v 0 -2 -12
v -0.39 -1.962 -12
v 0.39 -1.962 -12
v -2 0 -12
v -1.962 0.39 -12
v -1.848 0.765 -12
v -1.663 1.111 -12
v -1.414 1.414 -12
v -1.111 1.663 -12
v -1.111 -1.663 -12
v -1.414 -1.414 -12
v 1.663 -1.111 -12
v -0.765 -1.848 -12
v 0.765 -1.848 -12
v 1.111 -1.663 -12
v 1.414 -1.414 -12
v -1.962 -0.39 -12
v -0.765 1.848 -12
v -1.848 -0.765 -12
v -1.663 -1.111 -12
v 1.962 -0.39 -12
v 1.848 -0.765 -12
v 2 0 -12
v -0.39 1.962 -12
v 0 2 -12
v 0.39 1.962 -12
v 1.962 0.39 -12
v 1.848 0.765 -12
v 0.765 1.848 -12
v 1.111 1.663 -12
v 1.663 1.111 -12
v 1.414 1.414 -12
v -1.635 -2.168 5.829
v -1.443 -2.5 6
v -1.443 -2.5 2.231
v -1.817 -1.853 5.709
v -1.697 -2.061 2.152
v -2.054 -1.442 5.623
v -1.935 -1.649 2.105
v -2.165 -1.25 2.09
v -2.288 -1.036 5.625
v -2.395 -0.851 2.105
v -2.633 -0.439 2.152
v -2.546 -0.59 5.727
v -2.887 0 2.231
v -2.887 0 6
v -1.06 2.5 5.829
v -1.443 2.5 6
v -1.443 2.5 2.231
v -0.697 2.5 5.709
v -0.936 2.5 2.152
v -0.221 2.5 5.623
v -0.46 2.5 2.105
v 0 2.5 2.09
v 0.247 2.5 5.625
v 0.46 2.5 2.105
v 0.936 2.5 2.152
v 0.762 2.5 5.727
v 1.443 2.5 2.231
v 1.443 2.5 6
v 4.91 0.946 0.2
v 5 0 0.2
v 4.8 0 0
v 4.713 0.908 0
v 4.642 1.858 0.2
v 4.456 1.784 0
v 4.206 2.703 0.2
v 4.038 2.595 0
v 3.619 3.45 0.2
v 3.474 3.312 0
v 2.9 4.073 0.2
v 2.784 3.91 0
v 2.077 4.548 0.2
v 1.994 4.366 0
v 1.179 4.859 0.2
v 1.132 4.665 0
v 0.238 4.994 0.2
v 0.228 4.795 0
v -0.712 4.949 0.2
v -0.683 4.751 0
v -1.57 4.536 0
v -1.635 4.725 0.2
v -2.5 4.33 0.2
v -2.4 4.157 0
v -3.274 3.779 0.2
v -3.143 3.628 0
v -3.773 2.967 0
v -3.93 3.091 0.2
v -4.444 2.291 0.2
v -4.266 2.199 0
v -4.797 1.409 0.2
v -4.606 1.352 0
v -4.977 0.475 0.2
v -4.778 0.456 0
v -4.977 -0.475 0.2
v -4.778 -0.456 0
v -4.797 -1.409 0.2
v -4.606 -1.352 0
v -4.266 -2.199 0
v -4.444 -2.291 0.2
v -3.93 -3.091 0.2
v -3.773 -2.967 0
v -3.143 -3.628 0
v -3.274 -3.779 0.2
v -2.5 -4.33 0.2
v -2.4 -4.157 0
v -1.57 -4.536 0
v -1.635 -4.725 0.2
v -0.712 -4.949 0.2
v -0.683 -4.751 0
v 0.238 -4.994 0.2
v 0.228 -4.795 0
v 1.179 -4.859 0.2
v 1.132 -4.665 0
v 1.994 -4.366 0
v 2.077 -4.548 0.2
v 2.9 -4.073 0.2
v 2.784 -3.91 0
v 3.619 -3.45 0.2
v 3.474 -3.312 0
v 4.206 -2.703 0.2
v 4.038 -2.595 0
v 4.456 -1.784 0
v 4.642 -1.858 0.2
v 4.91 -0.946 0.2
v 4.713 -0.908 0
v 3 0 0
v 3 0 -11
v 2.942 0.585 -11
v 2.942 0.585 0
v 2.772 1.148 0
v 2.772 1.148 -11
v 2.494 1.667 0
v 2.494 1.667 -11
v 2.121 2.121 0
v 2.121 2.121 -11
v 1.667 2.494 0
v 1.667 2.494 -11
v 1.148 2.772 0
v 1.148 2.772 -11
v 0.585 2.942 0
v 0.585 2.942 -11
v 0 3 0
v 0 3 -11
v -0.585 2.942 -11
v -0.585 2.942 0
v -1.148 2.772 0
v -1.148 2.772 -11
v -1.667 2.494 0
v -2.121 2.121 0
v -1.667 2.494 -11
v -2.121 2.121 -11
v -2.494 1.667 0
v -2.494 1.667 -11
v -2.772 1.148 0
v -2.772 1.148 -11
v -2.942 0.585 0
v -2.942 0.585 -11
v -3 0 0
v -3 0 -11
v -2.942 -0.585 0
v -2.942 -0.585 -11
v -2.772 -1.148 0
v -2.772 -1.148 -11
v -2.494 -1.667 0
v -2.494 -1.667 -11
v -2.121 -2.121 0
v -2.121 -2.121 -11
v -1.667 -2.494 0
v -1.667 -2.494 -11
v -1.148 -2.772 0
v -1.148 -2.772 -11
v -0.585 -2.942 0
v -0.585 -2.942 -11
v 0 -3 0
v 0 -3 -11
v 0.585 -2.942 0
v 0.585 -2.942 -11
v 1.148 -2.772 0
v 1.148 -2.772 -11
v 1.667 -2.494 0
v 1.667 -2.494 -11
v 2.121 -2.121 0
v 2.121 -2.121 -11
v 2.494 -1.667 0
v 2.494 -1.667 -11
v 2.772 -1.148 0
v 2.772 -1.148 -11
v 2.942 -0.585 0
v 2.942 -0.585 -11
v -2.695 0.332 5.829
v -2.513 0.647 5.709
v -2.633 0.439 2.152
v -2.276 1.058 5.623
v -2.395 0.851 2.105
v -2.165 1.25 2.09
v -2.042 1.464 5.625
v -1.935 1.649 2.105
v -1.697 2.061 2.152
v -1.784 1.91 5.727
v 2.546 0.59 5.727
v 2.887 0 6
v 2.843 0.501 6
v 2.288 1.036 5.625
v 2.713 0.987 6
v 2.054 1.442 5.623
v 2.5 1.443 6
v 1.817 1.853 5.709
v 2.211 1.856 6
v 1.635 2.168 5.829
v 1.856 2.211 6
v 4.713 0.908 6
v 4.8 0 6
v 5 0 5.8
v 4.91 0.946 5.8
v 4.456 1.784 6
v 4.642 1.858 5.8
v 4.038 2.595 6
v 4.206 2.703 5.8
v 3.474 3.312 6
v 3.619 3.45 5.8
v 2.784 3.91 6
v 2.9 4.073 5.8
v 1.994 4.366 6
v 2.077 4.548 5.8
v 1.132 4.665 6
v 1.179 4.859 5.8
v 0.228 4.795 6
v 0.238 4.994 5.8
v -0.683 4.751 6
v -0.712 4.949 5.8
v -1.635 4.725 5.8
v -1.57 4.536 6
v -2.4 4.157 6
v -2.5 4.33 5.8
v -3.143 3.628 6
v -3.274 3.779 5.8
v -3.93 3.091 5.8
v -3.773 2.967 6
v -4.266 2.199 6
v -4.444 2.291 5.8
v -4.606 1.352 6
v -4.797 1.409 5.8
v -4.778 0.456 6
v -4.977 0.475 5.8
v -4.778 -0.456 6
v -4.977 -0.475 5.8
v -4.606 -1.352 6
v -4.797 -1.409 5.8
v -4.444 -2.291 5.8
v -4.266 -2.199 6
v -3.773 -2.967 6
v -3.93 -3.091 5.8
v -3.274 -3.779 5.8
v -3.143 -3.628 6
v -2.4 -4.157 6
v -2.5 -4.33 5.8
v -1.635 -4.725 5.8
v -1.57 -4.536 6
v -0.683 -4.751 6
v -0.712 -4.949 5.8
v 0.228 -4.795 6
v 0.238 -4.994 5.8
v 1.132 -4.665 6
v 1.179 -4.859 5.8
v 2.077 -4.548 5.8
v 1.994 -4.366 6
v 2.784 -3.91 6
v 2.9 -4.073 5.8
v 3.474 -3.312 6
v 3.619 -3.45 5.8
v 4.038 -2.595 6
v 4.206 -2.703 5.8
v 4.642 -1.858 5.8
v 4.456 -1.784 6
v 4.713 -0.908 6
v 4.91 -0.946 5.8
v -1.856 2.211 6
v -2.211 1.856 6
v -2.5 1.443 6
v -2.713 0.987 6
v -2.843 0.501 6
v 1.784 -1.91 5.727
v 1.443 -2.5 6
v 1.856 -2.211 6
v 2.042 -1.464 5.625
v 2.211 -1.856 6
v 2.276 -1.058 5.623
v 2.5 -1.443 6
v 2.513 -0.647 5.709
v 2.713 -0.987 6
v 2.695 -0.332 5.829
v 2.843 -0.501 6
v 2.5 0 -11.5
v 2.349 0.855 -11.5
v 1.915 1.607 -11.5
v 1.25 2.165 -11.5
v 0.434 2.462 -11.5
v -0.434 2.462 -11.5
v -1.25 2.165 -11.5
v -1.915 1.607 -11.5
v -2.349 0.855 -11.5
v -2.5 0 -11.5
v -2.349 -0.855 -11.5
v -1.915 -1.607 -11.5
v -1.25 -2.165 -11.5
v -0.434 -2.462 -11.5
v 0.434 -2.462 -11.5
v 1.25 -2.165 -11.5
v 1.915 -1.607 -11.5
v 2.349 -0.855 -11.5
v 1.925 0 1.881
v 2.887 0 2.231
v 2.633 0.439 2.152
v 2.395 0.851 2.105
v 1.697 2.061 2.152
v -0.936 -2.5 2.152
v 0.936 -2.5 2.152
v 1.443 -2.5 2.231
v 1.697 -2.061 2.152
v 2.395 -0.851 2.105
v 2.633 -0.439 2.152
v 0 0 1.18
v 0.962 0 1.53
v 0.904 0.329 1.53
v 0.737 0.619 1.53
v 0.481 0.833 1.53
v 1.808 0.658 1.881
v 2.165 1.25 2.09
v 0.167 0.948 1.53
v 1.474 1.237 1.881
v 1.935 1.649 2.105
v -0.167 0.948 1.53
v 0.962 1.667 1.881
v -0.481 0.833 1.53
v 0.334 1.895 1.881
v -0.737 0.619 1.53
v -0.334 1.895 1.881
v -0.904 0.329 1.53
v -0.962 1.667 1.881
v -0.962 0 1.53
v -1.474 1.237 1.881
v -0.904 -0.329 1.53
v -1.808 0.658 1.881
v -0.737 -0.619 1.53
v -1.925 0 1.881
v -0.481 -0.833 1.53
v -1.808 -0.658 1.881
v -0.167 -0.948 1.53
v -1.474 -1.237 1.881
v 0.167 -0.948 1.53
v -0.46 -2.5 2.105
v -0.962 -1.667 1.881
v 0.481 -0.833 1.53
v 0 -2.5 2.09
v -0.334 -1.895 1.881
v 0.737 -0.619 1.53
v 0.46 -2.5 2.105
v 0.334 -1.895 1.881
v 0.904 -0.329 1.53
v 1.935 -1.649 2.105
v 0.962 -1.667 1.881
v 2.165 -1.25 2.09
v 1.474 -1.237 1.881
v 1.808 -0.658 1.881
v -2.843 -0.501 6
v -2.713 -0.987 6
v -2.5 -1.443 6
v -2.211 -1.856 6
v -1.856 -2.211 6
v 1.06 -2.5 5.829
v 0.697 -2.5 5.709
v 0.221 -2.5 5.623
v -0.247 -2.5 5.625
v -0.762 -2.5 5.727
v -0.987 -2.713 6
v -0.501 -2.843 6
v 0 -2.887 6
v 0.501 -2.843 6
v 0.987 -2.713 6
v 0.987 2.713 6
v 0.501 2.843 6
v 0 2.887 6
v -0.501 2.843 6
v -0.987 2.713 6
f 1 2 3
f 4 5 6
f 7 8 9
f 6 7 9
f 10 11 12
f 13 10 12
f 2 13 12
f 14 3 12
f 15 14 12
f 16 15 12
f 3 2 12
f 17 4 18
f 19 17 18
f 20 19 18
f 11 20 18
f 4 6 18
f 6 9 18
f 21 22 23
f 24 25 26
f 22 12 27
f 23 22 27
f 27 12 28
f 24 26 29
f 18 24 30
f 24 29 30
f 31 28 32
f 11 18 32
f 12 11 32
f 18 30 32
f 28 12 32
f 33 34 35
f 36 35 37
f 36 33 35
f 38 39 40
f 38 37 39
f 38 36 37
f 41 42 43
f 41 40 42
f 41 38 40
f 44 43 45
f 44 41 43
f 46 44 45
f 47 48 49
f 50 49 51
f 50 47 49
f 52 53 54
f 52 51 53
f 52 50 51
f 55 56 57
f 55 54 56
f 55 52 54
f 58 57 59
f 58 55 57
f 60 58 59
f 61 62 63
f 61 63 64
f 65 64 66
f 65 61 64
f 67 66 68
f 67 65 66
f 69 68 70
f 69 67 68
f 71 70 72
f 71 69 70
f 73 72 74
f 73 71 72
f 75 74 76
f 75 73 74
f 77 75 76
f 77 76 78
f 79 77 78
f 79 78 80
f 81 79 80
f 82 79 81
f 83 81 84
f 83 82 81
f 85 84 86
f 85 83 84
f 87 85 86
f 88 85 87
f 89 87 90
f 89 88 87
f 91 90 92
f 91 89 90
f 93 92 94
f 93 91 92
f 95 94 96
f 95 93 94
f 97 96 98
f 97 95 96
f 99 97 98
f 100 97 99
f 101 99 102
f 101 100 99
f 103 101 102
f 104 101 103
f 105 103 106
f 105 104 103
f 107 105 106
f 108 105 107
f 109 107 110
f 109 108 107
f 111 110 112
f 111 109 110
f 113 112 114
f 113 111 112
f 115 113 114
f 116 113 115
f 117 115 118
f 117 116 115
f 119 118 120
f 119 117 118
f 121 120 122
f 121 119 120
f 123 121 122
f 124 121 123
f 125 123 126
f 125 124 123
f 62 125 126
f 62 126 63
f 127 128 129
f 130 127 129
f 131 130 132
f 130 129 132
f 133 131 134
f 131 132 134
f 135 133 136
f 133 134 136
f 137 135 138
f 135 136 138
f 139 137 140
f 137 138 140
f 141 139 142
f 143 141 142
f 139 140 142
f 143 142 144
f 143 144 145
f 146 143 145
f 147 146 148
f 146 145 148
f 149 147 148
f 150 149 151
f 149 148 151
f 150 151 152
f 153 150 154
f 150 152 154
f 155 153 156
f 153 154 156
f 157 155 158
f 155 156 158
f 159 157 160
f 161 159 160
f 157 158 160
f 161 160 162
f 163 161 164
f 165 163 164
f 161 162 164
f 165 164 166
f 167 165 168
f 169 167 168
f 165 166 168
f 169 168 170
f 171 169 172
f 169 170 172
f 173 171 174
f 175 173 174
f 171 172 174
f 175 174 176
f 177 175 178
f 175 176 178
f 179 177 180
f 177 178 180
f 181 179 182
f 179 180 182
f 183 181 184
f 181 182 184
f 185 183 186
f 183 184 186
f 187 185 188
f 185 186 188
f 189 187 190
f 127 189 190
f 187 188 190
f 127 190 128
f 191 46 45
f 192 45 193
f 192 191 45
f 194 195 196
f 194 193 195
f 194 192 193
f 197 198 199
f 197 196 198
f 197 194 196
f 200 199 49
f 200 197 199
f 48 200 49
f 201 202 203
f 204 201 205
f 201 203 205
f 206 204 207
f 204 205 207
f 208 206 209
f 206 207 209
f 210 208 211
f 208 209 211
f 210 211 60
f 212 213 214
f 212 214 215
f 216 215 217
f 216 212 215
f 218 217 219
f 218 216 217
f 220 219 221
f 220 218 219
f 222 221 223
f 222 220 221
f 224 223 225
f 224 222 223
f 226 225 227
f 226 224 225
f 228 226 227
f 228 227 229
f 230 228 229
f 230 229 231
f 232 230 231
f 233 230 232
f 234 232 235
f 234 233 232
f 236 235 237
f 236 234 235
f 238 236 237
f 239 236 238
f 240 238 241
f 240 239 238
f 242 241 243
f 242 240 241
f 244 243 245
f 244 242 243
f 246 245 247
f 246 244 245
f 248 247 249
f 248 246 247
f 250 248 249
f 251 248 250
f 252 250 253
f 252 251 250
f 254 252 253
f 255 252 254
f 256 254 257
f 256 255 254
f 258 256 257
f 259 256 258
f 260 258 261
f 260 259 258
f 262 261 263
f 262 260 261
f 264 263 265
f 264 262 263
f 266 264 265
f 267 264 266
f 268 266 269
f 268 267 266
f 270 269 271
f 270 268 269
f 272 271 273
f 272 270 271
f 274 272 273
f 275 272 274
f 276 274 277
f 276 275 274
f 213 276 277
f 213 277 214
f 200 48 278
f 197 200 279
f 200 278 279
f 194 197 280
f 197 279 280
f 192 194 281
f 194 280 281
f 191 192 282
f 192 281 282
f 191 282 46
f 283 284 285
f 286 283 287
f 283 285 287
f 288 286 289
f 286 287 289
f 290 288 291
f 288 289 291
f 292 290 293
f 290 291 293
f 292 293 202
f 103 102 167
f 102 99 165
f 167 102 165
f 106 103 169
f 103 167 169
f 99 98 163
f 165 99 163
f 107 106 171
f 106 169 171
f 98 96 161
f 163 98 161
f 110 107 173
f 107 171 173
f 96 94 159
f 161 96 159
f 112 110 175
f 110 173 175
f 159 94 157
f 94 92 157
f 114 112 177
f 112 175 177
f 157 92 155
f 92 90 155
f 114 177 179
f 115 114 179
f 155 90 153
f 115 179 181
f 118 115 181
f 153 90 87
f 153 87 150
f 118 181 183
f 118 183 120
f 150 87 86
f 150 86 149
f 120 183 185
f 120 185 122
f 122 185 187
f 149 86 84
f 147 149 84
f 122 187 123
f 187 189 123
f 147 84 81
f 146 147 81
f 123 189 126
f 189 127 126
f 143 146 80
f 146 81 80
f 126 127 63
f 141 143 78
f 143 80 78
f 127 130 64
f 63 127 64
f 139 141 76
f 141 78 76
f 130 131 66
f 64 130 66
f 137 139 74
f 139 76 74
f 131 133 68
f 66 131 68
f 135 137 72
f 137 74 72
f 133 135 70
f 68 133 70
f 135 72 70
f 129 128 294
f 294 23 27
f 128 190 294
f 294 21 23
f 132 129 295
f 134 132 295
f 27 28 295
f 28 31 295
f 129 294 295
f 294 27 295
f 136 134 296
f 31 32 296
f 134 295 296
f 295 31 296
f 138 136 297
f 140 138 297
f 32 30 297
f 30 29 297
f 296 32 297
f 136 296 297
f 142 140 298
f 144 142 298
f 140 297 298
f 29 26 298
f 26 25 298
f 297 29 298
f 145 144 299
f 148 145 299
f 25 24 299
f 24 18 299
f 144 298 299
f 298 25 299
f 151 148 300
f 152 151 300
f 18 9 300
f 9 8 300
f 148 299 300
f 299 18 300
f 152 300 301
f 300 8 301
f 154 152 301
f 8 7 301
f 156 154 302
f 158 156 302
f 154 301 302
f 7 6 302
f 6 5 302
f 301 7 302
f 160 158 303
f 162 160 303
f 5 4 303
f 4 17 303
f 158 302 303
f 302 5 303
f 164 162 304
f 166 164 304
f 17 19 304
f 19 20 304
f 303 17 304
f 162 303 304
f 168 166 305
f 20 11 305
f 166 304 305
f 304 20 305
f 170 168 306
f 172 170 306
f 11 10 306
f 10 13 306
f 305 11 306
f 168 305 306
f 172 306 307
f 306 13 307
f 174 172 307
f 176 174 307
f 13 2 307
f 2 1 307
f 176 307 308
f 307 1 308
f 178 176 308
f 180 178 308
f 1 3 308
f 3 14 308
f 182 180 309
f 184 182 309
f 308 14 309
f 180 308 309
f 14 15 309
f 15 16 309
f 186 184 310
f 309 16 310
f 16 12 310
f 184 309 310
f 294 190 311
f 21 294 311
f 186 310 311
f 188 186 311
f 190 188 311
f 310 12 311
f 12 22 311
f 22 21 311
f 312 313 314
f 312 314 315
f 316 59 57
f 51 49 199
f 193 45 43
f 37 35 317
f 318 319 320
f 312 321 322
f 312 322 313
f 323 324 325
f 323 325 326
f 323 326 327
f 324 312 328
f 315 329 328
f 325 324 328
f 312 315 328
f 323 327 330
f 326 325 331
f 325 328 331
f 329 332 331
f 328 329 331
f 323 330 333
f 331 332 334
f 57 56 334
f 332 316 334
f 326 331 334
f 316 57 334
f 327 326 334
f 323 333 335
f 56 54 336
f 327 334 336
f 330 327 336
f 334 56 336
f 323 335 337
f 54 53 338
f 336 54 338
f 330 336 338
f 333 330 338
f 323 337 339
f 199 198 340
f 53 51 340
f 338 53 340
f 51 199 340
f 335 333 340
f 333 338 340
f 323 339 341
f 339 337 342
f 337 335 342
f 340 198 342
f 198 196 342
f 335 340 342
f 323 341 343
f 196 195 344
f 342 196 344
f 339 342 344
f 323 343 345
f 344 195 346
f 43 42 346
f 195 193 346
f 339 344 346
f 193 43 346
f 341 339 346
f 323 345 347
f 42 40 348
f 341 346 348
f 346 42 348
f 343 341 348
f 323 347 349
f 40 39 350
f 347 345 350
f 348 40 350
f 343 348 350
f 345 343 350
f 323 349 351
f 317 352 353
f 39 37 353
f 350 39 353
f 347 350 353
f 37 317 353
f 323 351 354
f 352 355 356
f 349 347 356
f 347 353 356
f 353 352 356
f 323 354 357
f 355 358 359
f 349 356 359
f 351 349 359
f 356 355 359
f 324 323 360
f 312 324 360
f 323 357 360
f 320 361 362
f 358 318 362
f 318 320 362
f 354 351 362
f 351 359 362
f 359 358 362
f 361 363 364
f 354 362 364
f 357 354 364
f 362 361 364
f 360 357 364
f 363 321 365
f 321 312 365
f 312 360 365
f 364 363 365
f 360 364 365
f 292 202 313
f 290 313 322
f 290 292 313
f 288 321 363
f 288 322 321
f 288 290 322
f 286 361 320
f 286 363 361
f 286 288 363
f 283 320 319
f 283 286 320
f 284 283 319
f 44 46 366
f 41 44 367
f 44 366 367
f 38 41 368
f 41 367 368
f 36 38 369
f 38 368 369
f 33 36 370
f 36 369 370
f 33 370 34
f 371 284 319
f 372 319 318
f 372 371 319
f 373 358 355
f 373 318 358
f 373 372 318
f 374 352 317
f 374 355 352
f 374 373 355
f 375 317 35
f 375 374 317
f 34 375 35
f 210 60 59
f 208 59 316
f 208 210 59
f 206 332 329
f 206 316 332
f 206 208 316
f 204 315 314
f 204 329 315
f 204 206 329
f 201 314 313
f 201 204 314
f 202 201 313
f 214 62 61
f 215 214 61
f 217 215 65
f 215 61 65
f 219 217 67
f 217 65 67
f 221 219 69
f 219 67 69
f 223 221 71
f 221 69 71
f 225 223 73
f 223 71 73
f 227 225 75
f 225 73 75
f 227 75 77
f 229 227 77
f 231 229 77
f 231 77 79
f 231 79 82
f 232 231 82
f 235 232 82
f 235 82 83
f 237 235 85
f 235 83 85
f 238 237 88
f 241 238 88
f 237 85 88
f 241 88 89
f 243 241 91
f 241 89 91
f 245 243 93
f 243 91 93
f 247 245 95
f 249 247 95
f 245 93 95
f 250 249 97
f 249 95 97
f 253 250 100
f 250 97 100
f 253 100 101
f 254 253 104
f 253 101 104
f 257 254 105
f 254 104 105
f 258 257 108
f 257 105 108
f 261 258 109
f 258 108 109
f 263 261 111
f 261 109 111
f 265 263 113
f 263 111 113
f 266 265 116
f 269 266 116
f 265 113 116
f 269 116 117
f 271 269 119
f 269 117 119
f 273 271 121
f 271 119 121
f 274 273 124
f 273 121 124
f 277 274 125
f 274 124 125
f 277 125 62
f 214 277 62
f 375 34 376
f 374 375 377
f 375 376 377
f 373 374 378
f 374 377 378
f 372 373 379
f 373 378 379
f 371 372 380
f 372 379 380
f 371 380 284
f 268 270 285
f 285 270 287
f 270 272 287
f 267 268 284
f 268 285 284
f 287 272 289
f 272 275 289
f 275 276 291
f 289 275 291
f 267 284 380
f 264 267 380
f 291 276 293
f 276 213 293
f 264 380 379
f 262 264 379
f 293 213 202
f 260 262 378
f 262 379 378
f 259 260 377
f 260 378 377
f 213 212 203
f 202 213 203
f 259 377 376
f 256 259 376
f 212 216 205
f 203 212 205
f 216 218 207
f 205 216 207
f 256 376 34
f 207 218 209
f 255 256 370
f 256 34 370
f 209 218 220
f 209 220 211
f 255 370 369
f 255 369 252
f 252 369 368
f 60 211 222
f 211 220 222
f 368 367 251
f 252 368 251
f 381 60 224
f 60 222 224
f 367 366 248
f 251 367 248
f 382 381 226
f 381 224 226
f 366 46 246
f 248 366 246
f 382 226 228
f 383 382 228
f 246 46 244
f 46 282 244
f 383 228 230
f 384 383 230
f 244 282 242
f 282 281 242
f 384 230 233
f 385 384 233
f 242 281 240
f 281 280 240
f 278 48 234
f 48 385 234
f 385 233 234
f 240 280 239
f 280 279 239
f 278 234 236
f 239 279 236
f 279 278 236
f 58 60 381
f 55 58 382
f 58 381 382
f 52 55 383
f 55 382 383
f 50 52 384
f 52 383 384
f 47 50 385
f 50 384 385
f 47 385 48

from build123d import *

# Parameters (mm, degrees)
SKETCH001_R     = 6
POCKET_DEPTH    = 8.820854
CHAMFER_SIZE    = 1
CHAMFER001_SIZE = 0.2


with BuildPart() as pocket:
    # Sketch003 → Revolution001 (revolve)
    with BuildSketch(Plane.XZ):
        Polygon((0, 1.180146), (5, 3), (5, 10), (0, 10), align=None)
    revolve(axis=Axis((0, 0, 0), (0, 0, 1)))

    # Sketch001 → Pocket (cut, through all)
    with BuildSketch(Plane(origin=(0, 0, 10), x_dir=(-1, 0, 0), z_dir=(0, 0, 1))):
        Circle(SKETCH001_R)
        Polygon((-1.443376, 2.5), (1.443376, 2.5), (2.886751, 0), (1.443376, -2.5), (-1.443376, -2.5), (-2.886751, 0), align=None, mode=Mode.SUBTRACT)
    extrude(amount=-POCKET_DEPTH, mode=Mode.SUBTRACT)


with BuildPart() as chamfer001:
    # Sketch → Revolution (revolve)
    with BuildSketch(Plane.XZ):
        Polygon((2.88675, 6), (5, 6), (5, 0), (3, 0), (3, -12), (0, -12), (0, 3.113247), align=None)
    revolve(axis=Axis((0, 0, 0), (0, 0, 1)))

    # Cut: cut Pocket
    add(pocket.part, mode=Mode.SUBTRACT)

    # Chamfer
    chamfer_edges = [chamfer001.edges().sort_by_distance(p)[0] for p in [
        (-3, 0, -12),
    ]]
    chamfer(chamfer_edges, length=CHAMFER_SIZE)

    # Chamfer001
    chamfer001_edges = [chamfer001.edges().sort_by_distance(p)[0] for p in [
        (-5, 0, 6),
        (-5, 0, 0),
    ]]
    chamfer(chamfer001_edges, length=CHAMFER001_SIZE)


solid = chamfer001.part
